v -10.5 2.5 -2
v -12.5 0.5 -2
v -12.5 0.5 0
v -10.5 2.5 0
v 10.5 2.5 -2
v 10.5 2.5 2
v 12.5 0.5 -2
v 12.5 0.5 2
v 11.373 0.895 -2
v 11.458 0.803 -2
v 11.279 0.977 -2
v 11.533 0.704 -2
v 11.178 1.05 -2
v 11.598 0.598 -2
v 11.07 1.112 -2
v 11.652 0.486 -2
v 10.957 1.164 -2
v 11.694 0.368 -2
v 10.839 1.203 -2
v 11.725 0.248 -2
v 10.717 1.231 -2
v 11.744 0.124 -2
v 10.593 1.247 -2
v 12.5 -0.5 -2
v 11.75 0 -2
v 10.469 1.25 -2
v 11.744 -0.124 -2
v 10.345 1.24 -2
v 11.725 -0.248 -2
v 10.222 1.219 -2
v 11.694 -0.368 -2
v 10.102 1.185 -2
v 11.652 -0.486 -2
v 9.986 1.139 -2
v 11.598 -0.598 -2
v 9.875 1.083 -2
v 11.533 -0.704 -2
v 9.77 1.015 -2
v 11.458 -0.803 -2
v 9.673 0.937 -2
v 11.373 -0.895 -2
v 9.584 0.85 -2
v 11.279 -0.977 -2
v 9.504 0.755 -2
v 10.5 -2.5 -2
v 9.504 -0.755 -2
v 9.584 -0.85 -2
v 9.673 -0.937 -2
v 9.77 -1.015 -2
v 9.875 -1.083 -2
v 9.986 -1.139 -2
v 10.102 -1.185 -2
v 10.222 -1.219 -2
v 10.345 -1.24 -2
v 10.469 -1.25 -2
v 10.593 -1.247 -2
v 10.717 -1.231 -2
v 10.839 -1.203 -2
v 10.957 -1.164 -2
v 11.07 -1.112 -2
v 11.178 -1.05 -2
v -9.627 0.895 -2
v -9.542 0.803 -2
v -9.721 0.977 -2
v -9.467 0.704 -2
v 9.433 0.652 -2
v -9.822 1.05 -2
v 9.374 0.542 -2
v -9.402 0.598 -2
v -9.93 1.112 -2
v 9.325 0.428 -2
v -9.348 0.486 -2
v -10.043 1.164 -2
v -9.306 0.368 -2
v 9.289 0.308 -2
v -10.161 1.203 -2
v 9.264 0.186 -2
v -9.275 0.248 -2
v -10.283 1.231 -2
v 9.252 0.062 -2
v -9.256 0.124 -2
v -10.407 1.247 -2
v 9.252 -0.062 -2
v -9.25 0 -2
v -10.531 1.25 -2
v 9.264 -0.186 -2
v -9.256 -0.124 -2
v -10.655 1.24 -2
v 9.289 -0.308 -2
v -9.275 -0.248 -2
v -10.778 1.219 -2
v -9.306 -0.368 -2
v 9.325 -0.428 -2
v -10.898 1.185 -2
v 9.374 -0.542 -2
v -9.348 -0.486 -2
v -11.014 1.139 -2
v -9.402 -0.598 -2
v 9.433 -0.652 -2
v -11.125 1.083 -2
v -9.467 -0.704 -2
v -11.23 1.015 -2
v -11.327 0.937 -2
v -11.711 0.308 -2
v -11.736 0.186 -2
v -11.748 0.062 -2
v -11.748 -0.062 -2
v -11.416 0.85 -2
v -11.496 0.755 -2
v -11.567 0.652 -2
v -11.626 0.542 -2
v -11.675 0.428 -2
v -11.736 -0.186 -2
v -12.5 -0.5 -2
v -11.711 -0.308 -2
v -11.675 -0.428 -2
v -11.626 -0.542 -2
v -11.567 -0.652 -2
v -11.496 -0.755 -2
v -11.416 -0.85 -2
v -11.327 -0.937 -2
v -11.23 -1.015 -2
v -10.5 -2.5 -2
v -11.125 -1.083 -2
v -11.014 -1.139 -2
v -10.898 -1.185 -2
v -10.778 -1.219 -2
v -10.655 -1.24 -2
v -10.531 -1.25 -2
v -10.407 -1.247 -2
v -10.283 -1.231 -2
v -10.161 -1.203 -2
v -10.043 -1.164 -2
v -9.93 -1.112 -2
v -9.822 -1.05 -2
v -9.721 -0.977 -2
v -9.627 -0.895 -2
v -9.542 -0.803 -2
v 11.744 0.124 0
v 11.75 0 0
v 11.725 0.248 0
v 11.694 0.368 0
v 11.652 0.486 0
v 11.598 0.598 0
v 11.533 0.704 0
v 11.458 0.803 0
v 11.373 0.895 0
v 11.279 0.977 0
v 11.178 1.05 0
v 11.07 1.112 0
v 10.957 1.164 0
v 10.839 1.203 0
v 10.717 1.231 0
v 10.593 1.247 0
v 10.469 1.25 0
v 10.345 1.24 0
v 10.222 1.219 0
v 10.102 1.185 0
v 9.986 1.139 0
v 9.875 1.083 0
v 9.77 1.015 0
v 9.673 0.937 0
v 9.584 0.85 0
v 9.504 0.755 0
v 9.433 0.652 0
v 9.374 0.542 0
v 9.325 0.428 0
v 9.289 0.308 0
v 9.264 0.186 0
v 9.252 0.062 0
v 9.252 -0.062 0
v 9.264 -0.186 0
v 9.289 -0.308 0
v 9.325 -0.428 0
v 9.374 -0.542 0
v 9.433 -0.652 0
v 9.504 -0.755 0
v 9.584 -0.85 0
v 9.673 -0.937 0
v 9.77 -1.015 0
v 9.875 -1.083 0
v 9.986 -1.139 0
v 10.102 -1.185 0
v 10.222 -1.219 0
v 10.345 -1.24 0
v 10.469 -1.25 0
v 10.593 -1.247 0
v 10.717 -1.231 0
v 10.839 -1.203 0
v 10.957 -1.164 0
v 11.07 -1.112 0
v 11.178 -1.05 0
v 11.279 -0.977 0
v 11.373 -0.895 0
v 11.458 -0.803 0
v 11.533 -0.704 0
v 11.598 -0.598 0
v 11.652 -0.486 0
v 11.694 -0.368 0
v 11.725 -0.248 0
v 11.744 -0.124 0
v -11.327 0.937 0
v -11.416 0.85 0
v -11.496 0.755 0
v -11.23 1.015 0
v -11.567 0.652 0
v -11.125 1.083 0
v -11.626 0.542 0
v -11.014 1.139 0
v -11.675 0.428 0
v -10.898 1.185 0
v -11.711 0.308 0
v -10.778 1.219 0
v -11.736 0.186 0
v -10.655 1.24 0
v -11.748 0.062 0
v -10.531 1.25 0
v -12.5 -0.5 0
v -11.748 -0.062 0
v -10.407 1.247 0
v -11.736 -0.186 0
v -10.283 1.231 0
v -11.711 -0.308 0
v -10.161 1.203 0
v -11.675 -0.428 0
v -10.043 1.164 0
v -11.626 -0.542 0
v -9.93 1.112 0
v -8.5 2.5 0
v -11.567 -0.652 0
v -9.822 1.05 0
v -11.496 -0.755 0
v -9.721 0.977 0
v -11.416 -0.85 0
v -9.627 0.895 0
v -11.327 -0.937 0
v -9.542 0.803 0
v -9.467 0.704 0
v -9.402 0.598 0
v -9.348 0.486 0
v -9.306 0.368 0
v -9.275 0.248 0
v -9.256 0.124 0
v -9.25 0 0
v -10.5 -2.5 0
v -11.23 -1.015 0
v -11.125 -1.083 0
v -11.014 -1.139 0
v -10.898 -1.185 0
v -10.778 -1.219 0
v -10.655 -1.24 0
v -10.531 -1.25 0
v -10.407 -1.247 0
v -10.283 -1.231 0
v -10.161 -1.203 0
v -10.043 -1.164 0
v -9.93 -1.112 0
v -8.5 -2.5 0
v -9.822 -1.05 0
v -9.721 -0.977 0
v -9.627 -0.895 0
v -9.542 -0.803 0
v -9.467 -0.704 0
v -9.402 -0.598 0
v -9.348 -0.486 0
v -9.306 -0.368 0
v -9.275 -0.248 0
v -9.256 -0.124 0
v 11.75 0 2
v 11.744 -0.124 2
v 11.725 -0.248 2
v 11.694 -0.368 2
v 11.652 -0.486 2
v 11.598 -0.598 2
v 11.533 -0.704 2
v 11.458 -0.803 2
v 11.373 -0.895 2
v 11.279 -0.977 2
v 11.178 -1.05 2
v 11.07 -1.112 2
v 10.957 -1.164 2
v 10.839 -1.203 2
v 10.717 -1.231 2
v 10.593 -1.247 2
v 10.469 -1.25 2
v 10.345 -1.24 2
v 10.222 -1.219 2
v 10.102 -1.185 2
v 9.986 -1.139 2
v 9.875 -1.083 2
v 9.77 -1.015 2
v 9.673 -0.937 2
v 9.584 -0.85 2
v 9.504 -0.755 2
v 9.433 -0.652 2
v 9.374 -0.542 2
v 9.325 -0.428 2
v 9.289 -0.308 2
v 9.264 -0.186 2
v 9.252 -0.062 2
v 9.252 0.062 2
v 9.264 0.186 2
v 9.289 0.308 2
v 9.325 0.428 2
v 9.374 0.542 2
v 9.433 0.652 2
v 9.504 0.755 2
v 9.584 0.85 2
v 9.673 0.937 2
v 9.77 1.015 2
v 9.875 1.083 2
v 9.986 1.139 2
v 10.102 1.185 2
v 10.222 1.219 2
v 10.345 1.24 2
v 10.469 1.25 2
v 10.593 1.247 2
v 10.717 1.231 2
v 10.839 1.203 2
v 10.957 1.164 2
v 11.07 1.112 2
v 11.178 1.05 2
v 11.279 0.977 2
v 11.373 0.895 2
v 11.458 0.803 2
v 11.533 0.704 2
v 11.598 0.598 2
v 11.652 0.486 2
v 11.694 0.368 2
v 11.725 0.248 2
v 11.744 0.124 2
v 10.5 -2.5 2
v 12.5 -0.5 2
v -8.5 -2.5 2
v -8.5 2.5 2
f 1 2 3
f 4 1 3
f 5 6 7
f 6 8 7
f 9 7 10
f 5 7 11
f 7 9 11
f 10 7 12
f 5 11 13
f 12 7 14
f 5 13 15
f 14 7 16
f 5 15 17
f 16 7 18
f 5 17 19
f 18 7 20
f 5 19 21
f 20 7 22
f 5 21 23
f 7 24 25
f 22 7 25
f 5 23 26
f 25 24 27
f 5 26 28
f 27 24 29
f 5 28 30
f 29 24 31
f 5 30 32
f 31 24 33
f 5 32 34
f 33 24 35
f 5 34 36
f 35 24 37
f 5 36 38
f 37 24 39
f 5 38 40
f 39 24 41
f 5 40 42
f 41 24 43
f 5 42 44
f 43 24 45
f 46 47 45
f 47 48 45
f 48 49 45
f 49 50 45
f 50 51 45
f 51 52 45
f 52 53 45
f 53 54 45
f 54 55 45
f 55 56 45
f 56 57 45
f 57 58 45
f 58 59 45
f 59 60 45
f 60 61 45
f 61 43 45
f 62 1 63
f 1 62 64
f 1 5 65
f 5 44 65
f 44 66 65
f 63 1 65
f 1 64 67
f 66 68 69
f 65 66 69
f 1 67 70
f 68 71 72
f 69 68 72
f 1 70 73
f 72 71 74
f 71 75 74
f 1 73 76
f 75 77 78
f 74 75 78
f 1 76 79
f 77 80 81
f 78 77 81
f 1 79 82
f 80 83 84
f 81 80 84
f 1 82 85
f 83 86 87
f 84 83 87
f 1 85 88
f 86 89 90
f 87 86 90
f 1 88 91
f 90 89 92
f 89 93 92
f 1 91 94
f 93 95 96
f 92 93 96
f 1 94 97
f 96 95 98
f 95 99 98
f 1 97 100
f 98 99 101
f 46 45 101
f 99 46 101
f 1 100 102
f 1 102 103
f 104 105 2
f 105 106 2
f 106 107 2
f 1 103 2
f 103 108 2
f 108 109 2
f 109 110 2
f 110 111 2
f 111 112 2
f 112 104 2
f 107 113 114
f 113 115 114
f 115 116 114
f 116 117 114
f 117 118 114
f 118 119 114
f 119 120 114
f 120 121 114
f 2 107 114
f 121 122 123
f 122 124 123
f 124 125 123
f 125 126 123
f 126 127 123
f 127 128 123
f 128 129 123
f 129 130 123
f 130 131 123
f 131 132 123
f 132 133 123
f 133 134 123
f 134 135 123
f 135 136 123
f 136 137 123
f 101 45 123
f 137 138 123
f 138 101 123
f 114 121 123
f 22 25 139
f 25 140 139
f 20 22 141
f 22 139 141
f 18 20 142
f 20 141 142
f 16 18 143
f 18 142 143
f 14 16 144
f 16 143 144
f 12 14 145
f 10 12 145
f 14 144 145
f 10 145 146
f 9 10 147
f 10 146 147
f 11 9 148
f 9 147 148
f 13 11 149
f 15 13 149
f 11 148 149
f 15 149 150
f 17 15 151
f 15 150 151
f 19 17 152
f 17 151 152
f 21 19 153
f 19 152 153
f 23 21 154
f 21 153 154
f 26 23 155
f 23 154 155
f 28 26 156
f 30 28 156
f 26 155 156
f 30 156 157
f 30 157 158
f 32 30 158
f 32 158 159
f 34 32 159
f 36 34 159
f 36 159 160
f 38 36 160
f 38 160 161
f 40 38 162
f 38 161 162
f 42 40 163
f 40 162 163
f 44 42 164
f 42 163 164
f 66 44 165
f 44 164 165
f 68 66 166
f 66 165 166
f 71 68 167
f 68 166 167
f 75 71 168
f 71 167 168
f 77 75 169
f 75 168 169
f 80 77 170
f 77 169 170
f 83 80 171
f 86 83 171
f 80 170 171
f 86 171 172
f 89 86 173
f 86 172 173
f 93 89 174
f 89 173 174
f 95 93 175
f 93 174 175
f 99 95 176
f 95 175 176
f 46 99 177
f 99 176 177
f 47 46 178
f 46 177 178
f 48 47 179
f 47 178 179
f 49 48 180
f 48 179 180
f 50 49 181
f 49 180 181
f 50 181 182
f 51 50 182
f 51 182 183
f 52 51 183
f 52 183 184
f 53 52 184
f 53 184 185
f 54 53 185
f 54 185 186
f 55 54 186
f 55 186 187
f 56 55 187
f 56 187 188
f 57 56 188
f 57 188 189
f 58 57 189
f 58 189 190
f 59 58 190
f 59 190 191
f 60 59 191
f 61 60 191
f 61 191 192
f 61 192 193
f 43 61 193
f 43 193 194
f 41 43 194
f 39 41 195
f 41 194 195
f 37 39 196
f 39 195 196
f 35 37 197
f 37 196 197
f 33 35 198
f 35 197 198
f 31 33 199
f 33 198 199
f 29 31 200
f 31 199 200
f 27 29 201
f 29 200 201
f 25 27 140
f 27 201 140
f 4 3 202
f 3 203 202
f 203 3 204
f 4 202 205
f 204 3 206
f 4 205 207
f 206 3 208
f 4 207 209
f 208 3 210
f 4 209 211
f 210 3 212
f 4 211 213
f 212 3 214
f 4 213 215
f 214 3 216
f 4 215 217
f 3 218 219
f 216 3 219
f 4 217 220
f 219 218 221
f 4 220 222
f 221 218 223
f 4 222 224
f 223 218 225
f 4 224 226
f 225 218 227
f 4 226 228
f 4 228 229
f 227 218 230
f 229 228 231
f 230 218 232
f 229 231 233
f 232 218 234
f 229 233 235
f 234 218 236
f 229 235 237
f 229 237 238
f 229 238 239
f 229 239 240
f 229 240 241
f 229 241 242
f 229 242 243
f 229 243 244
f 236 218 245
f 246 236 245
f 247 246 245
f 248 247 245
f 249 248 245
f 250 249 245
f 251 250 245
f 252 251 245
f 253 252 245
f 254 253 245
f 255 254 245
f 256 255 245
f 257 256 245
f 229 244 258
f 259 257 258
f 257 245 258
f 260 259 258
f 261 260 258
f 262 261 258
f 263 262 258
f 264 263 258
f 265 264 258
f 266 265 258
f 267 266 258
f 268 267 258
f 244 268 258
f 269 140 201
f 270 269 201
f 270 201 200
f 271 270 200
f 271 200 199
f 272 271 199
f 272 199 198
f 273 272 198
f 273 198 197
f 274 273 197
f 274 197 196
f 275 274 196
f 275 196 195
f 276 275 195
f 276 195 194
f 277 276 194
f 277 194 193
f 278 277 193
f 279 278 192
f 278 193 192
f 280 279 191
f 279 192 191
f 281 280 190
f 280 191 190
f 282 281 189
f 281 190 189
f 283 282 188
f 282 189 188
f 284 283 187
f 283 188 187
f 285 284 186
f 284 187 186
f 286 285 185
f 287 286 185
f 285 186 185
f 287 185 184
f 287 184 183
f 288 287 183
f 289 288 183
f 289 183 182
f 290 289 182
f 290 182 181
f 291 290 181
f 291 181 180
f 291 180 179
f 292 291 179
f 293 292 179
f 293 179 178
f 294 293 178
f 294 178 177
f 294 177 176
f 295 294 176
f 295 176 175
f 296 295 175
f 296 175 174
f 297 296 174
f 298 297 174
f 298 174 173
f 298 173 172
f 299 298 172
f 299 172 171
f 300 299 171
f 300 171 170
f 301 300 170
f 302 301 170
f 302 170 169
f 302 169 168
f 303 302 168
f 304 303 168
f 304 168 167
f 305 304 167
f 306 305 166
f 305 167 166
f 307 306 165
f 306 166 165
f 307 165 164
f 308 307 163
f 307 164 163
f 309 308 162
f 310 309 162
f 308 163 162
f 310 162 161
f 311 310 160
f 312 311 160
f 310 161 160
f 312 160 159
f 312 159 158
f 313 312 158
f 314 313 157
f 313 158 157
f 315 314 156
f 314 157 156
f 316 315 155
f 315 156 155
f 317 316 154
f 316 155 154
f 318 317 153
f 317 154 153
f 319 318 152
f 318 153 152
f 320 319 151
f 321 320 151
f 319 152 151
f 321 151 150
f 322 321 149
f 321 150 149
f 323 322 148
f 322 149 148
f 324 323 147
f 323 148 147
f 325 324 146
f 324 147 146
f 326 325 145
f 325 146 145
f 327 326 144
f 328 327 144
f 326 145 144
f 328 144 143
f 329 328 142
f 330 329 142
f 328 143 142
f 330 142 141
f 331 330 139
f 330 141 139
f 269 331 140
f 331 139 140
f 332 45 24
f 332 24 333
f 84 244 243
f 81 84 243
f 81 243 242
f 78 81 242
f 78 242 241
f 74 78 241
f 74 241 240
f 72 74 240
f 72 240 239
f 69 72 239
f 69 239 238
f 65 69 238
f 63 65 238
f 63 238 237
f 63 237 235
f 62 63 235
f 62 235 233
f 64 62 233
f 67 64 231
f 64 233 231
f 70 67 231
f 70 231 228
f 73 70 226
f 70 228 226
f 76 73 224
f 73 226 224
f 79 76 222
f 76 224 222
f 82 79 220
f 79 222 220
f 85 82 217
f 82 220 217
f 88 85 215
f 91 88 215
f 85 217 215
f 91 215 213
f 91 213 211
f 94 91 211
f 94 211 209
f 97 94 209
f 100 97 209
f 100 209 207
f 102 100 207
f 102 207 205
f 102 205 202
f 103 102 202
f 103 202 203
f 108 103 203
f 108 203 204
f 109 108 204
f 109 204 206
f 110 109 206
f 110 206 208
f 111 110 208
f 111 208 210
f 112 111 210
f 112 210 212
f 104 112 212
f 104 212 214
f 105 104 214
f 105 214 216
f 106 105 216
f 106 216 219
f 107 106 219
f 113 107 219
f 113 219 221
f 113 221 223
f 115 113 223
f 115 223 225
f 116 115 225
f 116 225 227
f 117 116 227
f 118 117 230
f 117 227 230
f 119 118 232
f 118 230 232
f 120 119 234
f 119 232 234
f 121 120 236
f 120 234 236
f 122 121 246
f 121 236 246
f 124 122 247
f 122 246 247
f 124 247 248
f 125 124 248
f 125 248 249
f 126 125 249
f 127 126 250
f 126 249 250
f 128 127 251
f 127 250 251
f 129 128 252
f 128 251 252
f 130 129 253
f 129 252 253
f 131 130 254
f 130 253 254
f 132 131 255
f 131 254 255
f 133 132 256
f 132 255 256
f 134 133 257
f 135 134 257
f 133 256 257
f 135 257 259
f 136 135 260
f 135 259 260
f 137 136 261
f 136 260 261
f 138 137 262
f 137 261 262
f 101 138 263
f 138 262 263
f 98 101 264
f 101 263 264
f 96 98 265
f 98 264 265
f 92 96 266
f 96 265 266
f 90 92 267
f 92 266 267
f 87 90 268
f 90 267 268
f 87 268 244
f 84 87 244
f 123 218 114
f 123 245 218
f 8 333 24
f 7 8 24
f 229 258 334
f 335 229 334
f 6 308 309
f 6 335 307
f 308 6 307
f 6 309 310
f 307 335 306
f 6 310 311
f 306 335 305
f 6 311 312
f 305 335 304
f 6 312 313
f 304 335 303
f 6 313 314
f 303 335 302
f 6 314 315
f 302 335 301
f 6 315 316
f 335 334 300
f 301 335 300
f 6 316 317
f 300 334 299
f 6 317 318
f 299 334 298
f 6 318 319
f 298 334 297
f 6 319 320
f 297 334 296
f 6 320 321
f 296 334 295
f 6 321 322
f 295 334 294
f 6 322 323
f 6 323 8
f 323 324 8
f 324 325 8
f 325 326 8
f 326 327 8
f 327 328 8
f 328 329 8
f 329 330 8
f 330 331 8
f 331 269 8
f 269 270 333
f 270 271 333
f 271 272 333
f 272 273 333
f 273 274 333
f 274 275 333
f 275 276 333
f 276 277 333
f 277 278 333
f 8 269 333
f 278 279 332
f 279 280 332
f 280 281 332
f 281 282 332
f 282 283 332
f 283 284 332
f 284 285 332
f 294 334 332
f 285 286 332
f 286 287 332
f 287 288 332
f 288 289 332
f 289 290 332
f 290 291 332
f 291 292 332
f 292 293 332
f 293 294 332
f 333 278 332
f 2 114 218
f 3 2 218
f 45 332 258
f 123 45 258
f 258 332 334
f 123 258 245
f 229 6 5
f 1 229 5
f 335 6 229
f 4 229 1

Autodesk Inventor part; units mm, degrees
ref_plane "YZ Plane" through (0, 0, 0) normal (1, 0, 0) x (0, 1, 0)
ref_plane "XZ Plane" through (0, 0, 0) normal (0, 1, 0) x (-1, 0, 0)
ref_plane "XY Plane" through (0, 0, 0) normal (0, 0, 1) x (1, 0, 0)
sketch "スケッチ1" plane through (0, 0, 0) normal (0, 1, 0) x (-1, 0, 0)
  line L0 (-12.5, -2) -> (12.5, -2)
  line L1 (12.5, -2) -> (12.5, 2)
  line L2 (12.5, 2) -> (-12.5, 2)
  line L3 (-12.5, 2) -> (-12.5, -2)
  line L4 (-12.5, -2) -> (12.5, 2) construction
  line L5 (12.5, -2) -> (-12.5, 2) construction
  point P0 (0, 0)
  dimension "d0" = 25
  dimension "d1" = 4
extrude "押し出し1" add sketch "スケッチ1" along normal mid plane 5
sketch "スケッチ2" plane through (0, 0, 0) normal (0, 0, 1) x (1, 0, 0)
  circle A0 centre (-10.5, 0) radius 1.25
  line L0 (-12.5, -2.5) -> (-12.5, 2.5) projected
  circle A1 centre (10.5, 0) radius 1.25
  line L1 (12.5, -2.5) -> (12.5, 2.5) projected
  point P0 (0, 0)
  dimension "d4" = 2.5
  dimension "d5" = 2
  dimension "d14" = 2.5
  dimension "d15" = 2
extrude "押し出し2" cut sketch "スケッチ2" along normal mid plane 5 contours A0
chamfer "面取り1" distance 2 angle 45 1 edges at (-12.5, 2.5, 0)
chamfer "面取り2" distance 2 angle 45 1 edges at (-12.5, -2.5, 0)
sketch "スケッチ3" plane through (0, 0, 0) normal (0, 0, 1) x (1, 0, 0)
  circle A0 centre (10.5, 0) radius 1.25
  line L0 (12.5, -2.5) -> (12.5, 2.5) projected
  point P0 (0, 0)
  dimension "d16" = 2.5
  dimension "d17" = 2
extrude "押し出し3" cut sketch "スケッチ3" along normal mid plane 5
chamfer "面取り3" distance 2 angle 45 1 edges at (12.5, 2.5, 0)
chamfer "面取り4" distance 2 angle 45 1 edges at (12.5, -2.5, 0)
sketch "スケッチ4" plane through (0, -2.5, 0) normal (0, -1, 0) x (1, 0, 0)
  line L0 (-12.5, -2) -> (-12.5, 2) projected
  line L1 (-12.5, 0) -> (-8.5, 0)
  line L2 (-8.5, 0) -> (-8.5, 2)
  line L3 (-8.5, 2) -> (-12.5, 2)
  line L4 (-12.5, 2) -> (-12.5, 0)
  point P0 (0, 0)
  dimension "d26" = 4
extrude "押し出し4" cut sketch "スケッチ4" against normal blind 10
properties part number "promo_arm1'"
